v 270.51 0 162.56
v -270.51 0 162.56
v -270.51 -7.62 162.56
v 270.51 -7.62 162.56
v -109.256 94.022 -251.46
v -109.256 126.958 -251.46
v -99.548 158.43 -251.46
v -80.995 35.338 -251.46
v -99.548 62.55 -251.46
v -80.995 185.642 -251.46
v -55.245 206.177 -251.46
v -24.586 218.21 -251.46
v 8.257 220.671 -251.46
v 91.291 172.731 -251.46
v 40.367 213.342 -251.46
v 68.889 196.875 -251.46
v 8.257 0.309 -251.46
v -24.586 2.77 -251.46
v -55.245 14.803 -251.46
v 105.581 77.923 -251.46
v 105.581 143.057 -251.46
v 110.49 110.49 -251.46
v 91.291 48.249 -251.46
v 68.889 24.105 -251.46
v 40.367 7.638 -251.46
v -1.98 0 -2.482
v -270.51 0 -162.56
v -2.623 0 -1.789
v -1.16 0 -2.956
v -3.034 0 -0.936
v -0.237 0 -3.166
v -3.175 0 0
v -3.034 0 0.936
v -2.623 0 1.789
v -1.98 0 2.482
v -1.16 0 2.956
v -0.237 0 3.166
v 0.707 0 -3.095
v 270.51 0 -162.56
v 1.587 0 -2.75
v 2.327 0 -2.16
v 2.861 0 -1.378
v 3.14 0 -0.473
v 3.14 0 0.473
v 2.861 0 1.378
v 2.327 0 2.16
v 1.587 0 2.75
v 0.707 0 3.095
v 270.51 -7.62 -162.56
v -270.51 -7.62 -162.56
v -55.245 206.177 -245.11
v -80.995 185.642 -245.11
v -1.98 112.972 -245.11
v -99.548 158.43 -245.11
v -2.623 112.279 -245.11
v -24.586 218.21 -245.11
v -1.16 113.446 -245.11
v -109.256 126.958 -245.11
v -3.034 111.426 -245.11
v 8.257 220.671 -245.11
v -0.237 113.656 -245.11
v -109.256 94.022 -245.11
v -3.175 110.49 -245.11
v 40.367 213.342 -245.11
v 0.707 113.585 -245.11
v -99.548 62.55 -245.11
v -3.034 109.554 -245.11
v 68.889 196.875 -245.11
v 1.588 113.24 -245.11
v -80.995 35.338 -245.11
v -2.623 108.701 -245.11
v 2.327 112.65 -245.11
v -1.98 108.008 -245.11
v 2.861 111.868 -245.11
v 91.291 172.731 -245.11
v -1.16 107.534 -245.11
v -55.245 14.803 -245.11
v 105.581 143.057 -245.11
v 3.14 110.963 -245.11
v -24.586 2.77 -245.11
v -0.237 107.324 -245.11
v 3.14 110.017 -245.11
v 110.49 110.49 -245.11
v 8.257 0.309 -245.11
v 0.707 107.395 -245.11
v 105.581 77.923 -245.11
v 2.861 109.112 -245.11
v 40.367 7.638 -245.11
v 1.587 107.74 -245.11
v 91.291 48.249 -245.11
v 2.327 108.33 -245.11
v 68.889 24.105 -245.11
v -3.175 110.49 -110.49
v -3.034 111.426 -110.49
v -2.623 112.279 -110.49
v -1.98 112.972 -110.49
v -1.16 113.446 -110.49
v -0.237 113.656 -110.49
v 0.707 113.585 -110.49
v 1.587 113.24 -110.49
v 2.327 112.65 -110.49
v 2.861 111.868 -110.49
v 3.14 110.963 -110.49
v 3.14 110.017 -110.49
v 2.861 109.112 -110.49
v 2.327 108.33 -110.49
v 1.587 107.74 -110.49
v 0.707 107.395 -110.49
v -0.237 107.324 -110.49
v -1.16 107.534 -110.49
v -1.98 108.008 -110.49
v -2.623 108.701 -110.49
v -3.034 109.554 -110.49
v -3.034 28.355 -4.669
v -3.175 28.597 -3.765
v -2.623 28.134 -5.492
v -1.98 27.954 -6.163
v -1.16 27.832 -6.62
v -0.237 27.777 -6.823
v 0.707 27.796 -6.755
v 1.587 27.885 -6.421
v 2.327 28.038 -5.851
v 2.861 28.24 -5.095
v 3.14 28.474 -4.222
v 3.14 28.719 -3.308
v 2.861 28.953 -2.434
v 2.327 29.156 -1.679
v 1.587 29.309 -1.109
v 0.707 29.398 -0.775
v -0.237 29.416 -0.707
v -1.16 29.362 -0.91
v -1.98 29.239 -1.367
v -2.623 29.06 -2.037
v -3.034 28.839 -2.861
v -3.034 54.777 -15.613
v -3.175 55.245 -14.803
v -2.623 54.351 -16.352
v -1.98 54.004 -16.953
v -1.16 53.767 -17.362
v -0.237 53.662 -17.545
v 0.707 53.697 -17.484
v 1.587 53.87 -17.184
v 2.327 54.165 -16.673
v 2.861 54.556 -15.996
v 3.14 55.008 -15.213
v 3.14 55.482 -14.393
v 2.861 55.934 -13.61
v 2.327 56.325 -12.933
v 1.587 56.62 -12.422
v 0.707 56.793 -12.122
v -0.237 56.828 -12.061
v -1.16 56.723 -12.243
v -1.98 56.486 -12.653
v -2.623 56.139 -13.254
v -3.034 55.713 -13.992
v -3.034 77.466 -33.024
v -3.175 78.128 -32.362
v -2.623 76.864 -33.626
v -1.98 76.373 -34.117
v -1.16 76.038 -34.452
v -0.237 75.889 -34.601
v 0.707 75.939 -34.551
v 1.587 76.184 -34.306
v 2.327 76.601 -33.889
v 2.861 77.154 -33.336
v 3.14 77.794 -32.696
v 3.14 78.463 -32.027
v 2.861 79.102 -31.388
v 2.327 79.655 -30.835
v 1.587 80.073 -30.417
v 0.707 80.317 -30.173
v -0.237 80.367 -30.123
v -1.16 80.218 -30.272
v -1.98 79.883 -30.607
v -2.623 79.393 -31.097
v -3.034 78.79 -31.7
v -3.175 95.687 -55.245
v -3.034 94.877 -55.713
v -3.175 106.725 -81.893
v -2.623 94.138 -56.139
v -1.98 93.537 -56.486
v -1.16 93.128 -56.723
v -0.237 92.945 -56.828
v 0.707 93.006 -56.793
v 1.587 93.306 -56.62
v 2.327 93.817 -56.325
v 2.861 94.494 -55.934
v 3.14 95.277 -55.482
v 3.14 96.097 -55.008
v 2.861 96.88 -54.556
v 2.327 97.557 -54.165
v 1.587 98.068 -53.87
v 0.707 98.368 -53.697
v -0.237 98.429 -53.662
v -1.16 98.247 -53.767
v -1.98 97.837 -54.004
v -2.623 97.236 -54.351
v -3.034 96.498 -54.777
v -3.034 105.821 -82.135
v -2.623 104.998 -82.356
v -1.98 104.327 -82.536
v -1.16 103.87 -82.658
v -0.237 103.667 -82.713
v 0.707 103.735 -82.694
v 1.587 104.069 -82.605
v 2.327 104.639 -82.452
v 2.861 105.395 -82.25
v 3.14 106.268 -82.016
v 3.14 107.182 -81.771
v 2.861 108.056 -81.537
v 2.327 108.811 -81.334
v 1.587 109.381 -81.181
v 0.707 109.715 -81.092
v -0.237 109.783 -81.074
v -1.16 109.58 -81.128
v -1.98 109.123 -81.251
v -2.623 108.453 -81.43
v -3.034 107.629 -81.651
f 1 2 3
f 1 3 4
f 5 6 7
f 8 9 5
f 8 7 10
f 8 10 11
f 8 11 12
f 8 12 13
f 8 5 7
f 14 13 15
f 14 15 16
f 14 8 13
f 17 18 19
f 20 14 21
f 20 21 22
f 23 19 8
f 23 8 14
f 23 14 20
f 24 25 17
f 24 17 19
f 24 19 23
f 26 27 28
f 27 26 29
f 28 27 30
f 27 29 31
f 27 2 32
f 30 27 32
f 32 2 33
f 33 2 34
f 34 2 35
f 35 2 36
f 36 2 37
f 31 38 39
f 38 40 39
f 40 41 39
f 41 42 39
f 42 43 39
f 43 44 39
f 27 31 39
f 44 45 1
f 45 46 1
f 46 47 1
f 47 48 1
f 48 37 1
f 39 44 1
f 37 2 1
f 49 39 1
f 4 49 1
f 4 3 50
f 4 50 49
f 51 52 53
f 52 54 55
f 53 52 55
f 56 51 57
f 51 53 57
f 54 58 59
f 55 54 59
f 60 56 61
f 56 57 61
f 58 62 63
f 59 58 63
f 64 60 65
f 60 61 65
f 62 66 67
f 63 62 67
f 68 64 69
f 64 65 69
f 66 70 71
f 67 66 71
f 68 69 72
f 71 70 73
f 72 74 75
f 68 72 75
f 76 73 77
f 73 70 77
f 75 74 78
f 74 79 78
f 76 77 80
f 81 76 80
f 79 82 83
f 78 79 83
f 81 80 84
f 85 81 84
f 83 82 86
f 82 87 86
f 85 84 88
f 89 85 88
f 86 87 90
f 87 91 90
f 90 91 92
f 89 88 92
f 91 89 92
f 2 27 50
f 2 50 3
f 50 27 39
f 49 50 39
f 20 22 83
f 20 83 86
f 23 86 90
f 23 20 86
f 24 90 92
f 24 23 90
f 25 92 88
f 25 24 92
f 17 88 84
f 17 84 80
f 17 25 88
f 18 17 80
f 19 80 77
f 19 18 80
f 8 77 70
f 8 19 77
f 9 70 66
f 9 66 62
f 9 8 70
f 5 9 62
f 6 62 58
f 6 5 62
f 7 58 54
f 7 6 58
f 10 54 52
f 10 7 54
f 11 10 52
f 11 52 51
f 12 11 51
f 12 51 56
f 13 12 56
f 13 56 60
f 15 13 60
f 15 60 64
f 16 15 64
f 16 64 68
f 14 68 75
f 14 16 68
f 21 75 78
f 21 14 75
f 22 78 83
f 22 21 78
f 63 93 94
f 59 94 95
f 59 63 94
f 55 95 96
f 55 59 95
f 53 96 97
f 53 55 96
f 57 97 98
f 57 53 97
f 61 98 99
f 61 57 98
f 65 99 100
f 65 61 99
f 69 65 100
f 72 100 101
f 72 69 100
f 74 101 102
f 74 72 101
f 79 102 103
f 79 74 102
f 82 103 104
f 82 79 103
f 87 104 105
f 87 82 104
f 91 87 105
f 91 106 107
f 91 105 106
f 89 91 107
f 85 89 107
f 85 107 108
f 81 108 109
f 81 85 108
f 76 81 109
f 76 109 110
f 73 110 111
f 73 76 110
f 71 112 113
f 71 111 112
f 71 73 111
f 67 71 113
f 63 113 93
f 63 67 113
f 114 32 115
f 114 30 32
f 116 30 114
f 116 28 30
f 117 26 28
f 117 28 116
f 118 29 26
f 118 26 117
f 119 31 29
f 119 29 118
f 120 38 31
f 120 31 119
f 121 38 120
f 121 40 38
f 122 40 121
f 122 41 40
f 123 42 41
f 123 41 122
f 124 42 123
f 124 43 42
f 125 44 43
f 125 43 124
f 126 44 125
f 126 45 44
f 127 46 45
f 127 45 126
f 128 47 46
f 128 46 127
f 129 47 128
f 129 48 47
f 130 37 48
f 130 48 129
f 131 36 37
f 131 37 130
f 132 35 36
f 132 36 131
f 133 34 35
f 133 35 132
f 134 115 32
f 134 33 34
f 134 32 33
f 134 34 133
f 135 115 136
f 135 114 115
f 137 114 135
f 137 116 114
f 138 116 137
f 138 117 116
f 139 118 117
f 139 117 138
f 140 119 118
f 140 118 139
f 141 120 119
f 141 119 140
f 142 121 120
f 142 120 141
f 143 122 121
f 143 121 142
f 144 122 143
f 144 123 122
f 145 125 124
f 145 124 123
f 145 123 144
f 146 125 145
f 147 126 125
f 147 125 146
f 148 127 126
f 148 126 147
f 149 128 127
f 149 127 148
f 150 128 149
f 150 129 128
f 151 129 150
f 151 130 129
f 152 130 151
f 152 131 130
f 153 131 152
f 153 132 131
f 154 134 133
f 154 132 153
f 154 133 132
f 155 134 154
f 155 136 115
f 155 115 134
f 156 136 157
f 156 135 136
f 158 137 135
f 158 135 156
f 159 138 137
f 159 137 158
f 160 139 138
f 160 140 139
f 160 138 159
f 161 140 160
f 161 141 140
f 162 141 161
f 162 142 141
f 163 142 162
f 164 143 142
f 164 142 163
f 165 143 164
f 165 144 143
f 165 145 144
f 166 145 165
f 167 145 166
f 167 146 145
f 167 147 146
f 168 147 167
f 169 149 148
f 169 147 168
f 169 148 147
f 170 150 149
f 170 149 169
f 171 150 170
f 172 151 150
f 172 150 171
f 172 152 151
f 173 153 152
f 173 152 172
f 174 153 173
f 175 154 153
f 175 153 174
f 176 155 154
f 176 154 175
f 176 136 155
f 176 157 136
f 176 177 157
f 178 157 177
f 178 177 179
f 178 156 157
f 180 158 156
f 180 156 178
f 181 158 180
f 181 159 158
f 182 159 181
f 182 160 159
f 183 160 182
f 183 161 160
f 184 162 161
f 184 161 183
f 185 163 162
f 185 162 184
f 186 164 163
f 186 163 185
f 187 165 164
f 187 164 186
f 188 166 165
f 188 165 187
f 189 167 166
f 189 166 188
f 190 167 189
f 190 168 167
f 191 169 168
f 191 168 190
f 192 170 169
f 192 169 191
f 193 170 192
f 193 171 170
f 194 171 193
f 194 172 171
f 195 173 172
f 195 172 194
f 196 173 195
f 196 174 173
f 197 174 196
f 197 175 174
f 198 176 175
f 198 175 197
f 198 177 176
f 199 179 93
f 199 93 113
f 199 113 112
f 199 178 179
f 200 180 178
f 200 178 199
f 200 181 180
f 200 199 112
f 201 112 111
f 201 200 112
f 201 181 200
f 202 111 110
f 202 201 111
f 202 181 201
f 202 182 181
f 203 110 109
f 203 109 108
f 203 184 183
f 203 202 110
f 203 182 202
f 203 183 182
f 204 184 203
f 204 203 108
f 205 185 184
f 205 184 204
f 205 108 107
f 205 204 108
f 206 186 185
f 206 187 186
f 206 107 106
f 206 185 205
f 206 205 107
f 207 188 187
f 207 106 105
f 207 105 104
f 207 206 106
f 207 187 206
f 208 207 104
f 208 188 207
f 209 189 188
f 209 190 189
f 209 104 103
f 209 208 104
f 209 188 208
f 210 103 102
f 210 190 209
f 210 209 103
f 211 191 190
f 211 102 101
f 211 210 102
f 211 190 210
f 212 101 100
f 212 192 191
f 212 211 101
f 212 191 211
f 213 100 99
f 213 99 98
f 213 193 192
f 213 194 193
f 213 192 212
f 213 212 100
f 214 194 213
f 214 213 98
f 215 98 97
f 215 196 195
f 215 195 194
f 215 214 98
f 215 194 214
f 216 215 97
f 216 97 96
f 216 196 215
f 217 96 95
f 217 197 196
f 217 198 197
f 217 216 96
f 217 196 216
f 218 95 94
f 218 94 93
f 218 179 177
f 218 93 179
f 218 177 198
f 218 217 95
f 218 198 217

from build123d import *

# Parameters (mm, degrees)
F0_W     = 541.02
F0_H     = 325.12
F1_DEPTH = 7.62
F3_R     = 3.175
F5_R     = 110.49
F5_R_2   = 3.175
F6_DEPTH = 6.35


with BuildPart() as f1:
    # F0 (on Front) → F1 (new body)
    with BuildSketch(Plane.XZ):
        Rectangle(F0_W, F0_H)
    extrude(amount=F1_DEPTH)

    # F4: sweep along a path in F2
    with BuildLine(Plane.YZ) as f4_path:
        ThreePointArc((0, 0), (78.1282282533, -32.3617717467), (110.49, -110.49))
        Line((110.49, -110.49), (110.49, -251.46))
    # F3 (on face) → F4 (sweep)
    with BuildSketch(Plane(origin=(0, 0, 0), x_dir=(-1, 0, 0), z_dir=(0, 1, 0))):
        Circle(F3_R)
    sweep(path=f4_path.line)

    # F5 (on face) → F6 (join)
    with BuildSketch(Plane(origin=(0, 0, -251.46), x_dir=(1, 0, 0), z_dir=(0, 0, -1))):
        with Locations((0, -110.49)):
            Circle(F5_R)
        with Locations((0, -110.49)):
            Circle(F5_R_2, mode=Mode.SUBTRACT)
    extrude(amount=-F6_DEPTH)


solid = f1.part
